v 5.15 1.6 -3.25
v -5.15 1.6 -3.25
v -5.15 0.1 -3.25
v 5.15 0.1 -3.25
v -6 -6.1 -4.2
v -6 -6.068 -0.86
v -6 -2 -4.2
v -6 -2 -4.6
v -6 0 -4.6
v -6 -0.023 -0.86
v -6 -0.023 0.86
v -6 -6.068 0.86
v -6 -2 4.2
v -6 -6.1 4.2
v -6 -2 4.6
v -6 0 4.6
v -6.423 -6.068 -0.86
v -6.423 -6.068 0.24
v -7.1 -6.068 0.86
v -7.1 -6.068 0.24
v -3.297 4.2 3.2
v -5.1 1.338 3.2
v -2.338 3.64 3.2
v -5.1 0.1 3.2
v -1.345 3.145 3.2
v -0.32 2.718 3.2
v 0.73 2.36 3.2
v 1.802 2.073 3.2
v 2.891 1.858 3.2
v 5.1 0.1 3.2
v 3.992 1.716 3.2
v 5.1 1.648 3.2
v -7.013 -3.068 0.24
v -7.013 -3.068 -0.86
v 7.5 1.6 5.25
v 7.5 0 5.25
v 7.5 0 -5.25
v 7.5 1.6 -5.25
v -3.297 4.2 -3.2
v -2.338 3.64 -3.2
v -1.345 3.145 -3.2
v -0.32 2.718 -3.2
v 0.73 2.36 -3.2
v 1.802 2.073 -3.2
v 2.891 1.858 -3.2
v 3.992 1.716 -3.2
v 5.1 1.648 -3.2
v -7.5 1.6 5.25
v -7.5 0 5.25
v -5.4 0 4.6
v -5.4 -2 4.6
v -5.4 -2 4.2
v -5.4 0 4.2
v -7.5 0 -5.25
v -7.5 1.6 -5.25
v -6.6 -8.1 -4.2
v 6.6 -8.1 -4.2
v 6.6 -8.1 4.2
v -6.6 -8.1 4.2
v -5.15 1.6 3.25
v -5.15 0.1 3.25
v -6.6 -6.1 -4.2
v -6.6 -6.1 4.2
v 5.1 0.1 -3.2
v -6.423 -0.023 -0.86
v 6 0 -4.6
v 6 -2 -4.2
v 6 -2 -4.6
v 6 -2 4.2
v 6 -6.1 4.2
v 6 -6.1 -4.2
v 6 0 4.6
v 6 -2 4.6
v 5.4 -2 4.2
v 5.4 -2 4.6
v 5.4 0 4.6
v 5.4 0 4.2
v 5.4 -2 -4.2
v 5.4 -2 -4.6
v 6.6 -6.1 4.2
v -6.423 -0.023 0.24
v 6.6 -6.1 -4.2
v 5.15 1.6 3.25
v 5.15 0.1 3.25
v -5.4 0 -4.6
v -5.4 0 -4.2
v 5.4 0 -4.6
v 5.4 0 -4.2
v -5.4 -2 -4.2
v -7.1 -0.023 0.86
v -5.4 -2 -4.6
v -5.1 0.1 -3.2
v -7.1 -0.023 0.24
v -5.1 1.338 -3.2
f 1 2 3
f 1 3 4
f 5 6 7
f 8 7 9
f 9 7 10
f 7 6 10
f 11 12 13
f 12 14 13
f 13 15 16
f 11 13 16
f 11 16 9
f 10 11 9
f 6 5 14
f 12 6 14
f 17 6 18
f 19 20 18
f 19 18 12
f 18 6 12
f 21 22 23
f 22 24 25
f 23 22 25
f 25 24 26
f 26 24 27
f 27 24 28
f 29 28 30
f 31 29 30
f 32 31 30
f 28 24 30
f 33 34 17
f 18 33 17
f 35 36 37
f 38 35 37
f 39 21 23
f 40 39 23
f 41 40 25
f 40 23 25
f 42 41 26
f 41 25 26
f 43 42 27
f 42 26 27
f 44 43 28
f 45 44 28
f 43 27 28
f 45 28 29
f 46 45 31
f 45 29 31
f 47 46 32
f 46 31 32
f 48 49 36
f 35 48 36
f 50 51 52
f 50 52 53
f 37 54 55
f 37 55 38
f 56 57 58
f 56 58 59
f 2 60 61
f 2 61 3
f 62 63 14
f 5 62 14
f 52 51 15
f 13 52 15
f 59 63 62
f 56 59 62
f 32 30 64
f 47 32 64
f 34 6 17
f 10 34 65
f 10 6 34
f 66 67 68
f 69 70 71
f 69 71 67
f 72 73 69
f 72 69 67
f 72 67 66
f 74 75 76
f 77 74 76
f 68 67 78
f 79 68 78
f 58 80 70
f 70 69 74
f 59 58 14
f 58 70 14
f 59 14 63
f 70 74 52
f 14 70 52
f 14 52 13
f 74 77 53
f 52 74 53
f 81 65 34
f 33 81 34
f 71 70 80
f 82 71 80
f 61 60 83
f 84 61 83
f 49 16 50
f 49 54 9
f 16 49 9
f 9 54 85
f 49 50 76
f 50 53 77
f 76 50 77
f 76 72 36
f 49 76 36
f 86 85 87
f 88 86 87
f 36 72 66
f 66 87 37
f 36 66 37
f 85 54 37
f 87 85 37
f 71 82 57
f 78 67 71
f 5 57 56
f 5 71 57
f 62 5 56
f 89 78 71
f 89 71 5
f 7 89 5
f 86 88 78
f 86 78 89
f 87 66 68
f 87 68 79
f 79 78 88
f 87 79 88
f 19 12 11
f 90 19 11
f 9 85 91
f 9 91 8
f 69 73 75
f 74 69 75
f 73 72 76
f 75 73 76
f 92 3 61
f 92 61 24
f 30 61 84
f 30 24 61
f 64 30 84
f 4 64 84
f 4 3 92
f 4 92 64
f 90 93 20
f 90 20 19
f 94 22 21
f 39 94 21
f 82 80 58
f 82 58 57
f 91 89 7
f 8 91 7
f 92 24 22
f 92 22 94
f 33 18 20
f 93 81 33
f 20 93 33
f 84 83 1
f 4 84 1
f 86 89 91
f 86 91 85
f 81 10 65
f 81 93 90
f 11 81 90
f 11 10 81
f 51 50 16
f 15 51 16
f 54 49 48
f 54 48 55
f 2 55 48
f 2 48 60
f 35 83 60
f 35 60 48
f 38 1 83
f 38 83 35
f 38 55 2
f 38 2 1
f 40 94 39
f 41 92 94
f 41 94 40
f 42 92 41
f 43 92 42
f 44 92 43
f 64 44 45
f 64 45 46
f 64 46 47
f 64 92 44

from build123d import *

# Parameters (mm, degrees)
SKETCH1_W           = 15
SKETCH1_H           = 10.5
BOSS_EXTRUDE1_DEPTH = 1.6
SKETCH2_W           = 10.3
SKETCH2_H           = 6.5
CUT_EXTRUDE1_DEPTH  = 1.5
SKETCH3_W           = 10.2
SKETCH3_H           = 6.4
BOSS_EXTRUDE2_DEPTH = 4.1
CUT_EXTRUDE4_DEPTH  = 6.4
SKETCH8_W           = 13.2
SKETCH8_H           = 8.4
BOSS_EXTRUDE5_DEPTH = 8.1
SKETCH9_W           = 0.6
SKETCH9_H           = 6.1
CUT_EXTRUDE30_DEPTH = 8.4
SKETCH10_W          = 0.6
SKETCH10_H          = 2
BOSS_EXTRUDE7_DEPTH = 0.4
LPATTERN3_COUNT     = 2
LPATTERN3_PITCH     = 8.8
SKETCH12_W          = 1.719741978
SKETCH12_H          = 6.045276093
BOSS_EXTRUDE8_DEPTH = 1.1
CUT_EXTRUDE42_DEPTH = 1.1


with BuildPart() as part:
    # Sketch1 → Boss-Extrude1 (new body)
    with BuildSketch(Plane(origin=(0, 0, 0), x_dir=(1, 0, 0), z_dir=(0, 1, 0))):
        Rectangle(SKETCH1_W, SKETCH1_H)
    extrude(amount=BOSS_EXTRUDE1_DEPTH)

    # Sketch2 → Cut-Extrude1 (cut)
    with BuildSketch(Plane(origin=(0, 1.6, 0), x_dir=(1, 0, 0), z_dir=(0, 1, 0))):
        Rectangle(SKETCH2_W, SKETCH2_H)
    extrude(amount=-CUT_EXTRUDE1_DEPTH, mode=Mode.SUBTRACT)

    # Sketch3 → Boss-Extrude2 (add)
    with BuildSketch(Plane(origin=(0, 0.1, 0), x_dir=(1, 0, 0), z_dir=(0, 1, 0))):
        Rectangle(SKETCH3_W, SKETCH3_H)
    extrude(amount=BOSS_EXTRUDE2_DEPTH)

    # Sketch4 → Cut-Extrude4 (cut)
    with BuildSketch(Plane.XY.offset(3.2)):
        Polygon((-5.1, 4.2), (-5.1, 1.33831827), (-3.296595892, 4.2), align=None)
        with BuildLine():
            Line((5.1, 4.2), (-3.296595892, 4.2))
            ThreePointArc((-3.296595892, 4.2), (0.730166495, 2.35961781), (5.1, 1.648016048))
            Line((5.1, 1.648016048), (5.1, 4.2))
        make_face()
    extrude(amount=-CUT_EXTRUDE4_DEPTH, mode=Mode.SUBTRACT)



with BuildPart() as body_2:
    # Sketch8 → Boss-Extrude5 (new body)
    with BuildSketch(Plane(origin=(0, 0, 0), x_dir=(-1, 0, 0), z_dir=(0, -1, 0))):
        Rectangle(SKETCH8_W, SKETCH8_H)
    extrude(amount=BOSS_EXTRUDE5_DEPTH)

    # Sketch9 → Cut-Extrude30 (cut)
    with BuildSketch(Plane.XY.offset(4.2)):
        with Locations((-6.3, -3.05)):
            Rectangle(SKETCH9_W, SKETCH9_H)
        with Locations((6.3, -3.05)):
            Rectangle(SKETCH9_W, SKETCH9_H)
    extrude(amount=-CUT_EXTRUDE30_DEPTH, mode=Mode.SUBTRACT)


with BuildPart() as part_1:
    add(part.part)

    add(body_2.part)  # Boss-Extrude7 merges body 2
    # Sketch10 → Boss-Extrude7 (add)
    with BuildSketch(Plane(origin=(0, 0, -4.2), x_dir=(-1, 0, 0), z_dir=(0, 0, -1))):
        with Locations((-5.7, -1)):
            Rectangle(SKETCH10_W, SKETCH10_H)
        with Locations((5.7, -1)):
            Rectangle(SKETCH10_W, SKETCH10_H)
    boss_extrude7 = extrude(amount=BOSS_EXTRUDE7_DEPTH)

    # LPattern3: Boss-Extrude7 ×2
    with Locations(*[(0, 0, i * LPATTERN3_PITCH) for i in range(1, LPATTERN3_COUNT)]):
        add(boss_extrude7)

    # Sketch12 → Boss-Extrude8 (add)
    with BuildSketch(Plane.ZY.offset(6)):
        with Locations((0, -3.045413524)):
            Rectangle(SKETCH12_W, SKETCH12_H)
    extrude(amount=BOSS_EXTRUDE8_DEPTH)

    # Sketch14 → Cut-Extrude42 (cut)
    with BuildSketch(Plane(origin=(0, 0, -0.859870989), x_dir=(-1, 0, 0), z_dir=(0, 0, -1))):
        Polygon((7.1, -0.022775477), (6.422538679, -0.022775477), (7.012651067, -3.06805157), (6.422765107, -6.06805157), (7.1, -6.06805157), align=None)
    extrude(amount=-CUT_EXTRUDE42_DEPTH, mode=Mode.SUBTRACT)


solid = part_1.part
